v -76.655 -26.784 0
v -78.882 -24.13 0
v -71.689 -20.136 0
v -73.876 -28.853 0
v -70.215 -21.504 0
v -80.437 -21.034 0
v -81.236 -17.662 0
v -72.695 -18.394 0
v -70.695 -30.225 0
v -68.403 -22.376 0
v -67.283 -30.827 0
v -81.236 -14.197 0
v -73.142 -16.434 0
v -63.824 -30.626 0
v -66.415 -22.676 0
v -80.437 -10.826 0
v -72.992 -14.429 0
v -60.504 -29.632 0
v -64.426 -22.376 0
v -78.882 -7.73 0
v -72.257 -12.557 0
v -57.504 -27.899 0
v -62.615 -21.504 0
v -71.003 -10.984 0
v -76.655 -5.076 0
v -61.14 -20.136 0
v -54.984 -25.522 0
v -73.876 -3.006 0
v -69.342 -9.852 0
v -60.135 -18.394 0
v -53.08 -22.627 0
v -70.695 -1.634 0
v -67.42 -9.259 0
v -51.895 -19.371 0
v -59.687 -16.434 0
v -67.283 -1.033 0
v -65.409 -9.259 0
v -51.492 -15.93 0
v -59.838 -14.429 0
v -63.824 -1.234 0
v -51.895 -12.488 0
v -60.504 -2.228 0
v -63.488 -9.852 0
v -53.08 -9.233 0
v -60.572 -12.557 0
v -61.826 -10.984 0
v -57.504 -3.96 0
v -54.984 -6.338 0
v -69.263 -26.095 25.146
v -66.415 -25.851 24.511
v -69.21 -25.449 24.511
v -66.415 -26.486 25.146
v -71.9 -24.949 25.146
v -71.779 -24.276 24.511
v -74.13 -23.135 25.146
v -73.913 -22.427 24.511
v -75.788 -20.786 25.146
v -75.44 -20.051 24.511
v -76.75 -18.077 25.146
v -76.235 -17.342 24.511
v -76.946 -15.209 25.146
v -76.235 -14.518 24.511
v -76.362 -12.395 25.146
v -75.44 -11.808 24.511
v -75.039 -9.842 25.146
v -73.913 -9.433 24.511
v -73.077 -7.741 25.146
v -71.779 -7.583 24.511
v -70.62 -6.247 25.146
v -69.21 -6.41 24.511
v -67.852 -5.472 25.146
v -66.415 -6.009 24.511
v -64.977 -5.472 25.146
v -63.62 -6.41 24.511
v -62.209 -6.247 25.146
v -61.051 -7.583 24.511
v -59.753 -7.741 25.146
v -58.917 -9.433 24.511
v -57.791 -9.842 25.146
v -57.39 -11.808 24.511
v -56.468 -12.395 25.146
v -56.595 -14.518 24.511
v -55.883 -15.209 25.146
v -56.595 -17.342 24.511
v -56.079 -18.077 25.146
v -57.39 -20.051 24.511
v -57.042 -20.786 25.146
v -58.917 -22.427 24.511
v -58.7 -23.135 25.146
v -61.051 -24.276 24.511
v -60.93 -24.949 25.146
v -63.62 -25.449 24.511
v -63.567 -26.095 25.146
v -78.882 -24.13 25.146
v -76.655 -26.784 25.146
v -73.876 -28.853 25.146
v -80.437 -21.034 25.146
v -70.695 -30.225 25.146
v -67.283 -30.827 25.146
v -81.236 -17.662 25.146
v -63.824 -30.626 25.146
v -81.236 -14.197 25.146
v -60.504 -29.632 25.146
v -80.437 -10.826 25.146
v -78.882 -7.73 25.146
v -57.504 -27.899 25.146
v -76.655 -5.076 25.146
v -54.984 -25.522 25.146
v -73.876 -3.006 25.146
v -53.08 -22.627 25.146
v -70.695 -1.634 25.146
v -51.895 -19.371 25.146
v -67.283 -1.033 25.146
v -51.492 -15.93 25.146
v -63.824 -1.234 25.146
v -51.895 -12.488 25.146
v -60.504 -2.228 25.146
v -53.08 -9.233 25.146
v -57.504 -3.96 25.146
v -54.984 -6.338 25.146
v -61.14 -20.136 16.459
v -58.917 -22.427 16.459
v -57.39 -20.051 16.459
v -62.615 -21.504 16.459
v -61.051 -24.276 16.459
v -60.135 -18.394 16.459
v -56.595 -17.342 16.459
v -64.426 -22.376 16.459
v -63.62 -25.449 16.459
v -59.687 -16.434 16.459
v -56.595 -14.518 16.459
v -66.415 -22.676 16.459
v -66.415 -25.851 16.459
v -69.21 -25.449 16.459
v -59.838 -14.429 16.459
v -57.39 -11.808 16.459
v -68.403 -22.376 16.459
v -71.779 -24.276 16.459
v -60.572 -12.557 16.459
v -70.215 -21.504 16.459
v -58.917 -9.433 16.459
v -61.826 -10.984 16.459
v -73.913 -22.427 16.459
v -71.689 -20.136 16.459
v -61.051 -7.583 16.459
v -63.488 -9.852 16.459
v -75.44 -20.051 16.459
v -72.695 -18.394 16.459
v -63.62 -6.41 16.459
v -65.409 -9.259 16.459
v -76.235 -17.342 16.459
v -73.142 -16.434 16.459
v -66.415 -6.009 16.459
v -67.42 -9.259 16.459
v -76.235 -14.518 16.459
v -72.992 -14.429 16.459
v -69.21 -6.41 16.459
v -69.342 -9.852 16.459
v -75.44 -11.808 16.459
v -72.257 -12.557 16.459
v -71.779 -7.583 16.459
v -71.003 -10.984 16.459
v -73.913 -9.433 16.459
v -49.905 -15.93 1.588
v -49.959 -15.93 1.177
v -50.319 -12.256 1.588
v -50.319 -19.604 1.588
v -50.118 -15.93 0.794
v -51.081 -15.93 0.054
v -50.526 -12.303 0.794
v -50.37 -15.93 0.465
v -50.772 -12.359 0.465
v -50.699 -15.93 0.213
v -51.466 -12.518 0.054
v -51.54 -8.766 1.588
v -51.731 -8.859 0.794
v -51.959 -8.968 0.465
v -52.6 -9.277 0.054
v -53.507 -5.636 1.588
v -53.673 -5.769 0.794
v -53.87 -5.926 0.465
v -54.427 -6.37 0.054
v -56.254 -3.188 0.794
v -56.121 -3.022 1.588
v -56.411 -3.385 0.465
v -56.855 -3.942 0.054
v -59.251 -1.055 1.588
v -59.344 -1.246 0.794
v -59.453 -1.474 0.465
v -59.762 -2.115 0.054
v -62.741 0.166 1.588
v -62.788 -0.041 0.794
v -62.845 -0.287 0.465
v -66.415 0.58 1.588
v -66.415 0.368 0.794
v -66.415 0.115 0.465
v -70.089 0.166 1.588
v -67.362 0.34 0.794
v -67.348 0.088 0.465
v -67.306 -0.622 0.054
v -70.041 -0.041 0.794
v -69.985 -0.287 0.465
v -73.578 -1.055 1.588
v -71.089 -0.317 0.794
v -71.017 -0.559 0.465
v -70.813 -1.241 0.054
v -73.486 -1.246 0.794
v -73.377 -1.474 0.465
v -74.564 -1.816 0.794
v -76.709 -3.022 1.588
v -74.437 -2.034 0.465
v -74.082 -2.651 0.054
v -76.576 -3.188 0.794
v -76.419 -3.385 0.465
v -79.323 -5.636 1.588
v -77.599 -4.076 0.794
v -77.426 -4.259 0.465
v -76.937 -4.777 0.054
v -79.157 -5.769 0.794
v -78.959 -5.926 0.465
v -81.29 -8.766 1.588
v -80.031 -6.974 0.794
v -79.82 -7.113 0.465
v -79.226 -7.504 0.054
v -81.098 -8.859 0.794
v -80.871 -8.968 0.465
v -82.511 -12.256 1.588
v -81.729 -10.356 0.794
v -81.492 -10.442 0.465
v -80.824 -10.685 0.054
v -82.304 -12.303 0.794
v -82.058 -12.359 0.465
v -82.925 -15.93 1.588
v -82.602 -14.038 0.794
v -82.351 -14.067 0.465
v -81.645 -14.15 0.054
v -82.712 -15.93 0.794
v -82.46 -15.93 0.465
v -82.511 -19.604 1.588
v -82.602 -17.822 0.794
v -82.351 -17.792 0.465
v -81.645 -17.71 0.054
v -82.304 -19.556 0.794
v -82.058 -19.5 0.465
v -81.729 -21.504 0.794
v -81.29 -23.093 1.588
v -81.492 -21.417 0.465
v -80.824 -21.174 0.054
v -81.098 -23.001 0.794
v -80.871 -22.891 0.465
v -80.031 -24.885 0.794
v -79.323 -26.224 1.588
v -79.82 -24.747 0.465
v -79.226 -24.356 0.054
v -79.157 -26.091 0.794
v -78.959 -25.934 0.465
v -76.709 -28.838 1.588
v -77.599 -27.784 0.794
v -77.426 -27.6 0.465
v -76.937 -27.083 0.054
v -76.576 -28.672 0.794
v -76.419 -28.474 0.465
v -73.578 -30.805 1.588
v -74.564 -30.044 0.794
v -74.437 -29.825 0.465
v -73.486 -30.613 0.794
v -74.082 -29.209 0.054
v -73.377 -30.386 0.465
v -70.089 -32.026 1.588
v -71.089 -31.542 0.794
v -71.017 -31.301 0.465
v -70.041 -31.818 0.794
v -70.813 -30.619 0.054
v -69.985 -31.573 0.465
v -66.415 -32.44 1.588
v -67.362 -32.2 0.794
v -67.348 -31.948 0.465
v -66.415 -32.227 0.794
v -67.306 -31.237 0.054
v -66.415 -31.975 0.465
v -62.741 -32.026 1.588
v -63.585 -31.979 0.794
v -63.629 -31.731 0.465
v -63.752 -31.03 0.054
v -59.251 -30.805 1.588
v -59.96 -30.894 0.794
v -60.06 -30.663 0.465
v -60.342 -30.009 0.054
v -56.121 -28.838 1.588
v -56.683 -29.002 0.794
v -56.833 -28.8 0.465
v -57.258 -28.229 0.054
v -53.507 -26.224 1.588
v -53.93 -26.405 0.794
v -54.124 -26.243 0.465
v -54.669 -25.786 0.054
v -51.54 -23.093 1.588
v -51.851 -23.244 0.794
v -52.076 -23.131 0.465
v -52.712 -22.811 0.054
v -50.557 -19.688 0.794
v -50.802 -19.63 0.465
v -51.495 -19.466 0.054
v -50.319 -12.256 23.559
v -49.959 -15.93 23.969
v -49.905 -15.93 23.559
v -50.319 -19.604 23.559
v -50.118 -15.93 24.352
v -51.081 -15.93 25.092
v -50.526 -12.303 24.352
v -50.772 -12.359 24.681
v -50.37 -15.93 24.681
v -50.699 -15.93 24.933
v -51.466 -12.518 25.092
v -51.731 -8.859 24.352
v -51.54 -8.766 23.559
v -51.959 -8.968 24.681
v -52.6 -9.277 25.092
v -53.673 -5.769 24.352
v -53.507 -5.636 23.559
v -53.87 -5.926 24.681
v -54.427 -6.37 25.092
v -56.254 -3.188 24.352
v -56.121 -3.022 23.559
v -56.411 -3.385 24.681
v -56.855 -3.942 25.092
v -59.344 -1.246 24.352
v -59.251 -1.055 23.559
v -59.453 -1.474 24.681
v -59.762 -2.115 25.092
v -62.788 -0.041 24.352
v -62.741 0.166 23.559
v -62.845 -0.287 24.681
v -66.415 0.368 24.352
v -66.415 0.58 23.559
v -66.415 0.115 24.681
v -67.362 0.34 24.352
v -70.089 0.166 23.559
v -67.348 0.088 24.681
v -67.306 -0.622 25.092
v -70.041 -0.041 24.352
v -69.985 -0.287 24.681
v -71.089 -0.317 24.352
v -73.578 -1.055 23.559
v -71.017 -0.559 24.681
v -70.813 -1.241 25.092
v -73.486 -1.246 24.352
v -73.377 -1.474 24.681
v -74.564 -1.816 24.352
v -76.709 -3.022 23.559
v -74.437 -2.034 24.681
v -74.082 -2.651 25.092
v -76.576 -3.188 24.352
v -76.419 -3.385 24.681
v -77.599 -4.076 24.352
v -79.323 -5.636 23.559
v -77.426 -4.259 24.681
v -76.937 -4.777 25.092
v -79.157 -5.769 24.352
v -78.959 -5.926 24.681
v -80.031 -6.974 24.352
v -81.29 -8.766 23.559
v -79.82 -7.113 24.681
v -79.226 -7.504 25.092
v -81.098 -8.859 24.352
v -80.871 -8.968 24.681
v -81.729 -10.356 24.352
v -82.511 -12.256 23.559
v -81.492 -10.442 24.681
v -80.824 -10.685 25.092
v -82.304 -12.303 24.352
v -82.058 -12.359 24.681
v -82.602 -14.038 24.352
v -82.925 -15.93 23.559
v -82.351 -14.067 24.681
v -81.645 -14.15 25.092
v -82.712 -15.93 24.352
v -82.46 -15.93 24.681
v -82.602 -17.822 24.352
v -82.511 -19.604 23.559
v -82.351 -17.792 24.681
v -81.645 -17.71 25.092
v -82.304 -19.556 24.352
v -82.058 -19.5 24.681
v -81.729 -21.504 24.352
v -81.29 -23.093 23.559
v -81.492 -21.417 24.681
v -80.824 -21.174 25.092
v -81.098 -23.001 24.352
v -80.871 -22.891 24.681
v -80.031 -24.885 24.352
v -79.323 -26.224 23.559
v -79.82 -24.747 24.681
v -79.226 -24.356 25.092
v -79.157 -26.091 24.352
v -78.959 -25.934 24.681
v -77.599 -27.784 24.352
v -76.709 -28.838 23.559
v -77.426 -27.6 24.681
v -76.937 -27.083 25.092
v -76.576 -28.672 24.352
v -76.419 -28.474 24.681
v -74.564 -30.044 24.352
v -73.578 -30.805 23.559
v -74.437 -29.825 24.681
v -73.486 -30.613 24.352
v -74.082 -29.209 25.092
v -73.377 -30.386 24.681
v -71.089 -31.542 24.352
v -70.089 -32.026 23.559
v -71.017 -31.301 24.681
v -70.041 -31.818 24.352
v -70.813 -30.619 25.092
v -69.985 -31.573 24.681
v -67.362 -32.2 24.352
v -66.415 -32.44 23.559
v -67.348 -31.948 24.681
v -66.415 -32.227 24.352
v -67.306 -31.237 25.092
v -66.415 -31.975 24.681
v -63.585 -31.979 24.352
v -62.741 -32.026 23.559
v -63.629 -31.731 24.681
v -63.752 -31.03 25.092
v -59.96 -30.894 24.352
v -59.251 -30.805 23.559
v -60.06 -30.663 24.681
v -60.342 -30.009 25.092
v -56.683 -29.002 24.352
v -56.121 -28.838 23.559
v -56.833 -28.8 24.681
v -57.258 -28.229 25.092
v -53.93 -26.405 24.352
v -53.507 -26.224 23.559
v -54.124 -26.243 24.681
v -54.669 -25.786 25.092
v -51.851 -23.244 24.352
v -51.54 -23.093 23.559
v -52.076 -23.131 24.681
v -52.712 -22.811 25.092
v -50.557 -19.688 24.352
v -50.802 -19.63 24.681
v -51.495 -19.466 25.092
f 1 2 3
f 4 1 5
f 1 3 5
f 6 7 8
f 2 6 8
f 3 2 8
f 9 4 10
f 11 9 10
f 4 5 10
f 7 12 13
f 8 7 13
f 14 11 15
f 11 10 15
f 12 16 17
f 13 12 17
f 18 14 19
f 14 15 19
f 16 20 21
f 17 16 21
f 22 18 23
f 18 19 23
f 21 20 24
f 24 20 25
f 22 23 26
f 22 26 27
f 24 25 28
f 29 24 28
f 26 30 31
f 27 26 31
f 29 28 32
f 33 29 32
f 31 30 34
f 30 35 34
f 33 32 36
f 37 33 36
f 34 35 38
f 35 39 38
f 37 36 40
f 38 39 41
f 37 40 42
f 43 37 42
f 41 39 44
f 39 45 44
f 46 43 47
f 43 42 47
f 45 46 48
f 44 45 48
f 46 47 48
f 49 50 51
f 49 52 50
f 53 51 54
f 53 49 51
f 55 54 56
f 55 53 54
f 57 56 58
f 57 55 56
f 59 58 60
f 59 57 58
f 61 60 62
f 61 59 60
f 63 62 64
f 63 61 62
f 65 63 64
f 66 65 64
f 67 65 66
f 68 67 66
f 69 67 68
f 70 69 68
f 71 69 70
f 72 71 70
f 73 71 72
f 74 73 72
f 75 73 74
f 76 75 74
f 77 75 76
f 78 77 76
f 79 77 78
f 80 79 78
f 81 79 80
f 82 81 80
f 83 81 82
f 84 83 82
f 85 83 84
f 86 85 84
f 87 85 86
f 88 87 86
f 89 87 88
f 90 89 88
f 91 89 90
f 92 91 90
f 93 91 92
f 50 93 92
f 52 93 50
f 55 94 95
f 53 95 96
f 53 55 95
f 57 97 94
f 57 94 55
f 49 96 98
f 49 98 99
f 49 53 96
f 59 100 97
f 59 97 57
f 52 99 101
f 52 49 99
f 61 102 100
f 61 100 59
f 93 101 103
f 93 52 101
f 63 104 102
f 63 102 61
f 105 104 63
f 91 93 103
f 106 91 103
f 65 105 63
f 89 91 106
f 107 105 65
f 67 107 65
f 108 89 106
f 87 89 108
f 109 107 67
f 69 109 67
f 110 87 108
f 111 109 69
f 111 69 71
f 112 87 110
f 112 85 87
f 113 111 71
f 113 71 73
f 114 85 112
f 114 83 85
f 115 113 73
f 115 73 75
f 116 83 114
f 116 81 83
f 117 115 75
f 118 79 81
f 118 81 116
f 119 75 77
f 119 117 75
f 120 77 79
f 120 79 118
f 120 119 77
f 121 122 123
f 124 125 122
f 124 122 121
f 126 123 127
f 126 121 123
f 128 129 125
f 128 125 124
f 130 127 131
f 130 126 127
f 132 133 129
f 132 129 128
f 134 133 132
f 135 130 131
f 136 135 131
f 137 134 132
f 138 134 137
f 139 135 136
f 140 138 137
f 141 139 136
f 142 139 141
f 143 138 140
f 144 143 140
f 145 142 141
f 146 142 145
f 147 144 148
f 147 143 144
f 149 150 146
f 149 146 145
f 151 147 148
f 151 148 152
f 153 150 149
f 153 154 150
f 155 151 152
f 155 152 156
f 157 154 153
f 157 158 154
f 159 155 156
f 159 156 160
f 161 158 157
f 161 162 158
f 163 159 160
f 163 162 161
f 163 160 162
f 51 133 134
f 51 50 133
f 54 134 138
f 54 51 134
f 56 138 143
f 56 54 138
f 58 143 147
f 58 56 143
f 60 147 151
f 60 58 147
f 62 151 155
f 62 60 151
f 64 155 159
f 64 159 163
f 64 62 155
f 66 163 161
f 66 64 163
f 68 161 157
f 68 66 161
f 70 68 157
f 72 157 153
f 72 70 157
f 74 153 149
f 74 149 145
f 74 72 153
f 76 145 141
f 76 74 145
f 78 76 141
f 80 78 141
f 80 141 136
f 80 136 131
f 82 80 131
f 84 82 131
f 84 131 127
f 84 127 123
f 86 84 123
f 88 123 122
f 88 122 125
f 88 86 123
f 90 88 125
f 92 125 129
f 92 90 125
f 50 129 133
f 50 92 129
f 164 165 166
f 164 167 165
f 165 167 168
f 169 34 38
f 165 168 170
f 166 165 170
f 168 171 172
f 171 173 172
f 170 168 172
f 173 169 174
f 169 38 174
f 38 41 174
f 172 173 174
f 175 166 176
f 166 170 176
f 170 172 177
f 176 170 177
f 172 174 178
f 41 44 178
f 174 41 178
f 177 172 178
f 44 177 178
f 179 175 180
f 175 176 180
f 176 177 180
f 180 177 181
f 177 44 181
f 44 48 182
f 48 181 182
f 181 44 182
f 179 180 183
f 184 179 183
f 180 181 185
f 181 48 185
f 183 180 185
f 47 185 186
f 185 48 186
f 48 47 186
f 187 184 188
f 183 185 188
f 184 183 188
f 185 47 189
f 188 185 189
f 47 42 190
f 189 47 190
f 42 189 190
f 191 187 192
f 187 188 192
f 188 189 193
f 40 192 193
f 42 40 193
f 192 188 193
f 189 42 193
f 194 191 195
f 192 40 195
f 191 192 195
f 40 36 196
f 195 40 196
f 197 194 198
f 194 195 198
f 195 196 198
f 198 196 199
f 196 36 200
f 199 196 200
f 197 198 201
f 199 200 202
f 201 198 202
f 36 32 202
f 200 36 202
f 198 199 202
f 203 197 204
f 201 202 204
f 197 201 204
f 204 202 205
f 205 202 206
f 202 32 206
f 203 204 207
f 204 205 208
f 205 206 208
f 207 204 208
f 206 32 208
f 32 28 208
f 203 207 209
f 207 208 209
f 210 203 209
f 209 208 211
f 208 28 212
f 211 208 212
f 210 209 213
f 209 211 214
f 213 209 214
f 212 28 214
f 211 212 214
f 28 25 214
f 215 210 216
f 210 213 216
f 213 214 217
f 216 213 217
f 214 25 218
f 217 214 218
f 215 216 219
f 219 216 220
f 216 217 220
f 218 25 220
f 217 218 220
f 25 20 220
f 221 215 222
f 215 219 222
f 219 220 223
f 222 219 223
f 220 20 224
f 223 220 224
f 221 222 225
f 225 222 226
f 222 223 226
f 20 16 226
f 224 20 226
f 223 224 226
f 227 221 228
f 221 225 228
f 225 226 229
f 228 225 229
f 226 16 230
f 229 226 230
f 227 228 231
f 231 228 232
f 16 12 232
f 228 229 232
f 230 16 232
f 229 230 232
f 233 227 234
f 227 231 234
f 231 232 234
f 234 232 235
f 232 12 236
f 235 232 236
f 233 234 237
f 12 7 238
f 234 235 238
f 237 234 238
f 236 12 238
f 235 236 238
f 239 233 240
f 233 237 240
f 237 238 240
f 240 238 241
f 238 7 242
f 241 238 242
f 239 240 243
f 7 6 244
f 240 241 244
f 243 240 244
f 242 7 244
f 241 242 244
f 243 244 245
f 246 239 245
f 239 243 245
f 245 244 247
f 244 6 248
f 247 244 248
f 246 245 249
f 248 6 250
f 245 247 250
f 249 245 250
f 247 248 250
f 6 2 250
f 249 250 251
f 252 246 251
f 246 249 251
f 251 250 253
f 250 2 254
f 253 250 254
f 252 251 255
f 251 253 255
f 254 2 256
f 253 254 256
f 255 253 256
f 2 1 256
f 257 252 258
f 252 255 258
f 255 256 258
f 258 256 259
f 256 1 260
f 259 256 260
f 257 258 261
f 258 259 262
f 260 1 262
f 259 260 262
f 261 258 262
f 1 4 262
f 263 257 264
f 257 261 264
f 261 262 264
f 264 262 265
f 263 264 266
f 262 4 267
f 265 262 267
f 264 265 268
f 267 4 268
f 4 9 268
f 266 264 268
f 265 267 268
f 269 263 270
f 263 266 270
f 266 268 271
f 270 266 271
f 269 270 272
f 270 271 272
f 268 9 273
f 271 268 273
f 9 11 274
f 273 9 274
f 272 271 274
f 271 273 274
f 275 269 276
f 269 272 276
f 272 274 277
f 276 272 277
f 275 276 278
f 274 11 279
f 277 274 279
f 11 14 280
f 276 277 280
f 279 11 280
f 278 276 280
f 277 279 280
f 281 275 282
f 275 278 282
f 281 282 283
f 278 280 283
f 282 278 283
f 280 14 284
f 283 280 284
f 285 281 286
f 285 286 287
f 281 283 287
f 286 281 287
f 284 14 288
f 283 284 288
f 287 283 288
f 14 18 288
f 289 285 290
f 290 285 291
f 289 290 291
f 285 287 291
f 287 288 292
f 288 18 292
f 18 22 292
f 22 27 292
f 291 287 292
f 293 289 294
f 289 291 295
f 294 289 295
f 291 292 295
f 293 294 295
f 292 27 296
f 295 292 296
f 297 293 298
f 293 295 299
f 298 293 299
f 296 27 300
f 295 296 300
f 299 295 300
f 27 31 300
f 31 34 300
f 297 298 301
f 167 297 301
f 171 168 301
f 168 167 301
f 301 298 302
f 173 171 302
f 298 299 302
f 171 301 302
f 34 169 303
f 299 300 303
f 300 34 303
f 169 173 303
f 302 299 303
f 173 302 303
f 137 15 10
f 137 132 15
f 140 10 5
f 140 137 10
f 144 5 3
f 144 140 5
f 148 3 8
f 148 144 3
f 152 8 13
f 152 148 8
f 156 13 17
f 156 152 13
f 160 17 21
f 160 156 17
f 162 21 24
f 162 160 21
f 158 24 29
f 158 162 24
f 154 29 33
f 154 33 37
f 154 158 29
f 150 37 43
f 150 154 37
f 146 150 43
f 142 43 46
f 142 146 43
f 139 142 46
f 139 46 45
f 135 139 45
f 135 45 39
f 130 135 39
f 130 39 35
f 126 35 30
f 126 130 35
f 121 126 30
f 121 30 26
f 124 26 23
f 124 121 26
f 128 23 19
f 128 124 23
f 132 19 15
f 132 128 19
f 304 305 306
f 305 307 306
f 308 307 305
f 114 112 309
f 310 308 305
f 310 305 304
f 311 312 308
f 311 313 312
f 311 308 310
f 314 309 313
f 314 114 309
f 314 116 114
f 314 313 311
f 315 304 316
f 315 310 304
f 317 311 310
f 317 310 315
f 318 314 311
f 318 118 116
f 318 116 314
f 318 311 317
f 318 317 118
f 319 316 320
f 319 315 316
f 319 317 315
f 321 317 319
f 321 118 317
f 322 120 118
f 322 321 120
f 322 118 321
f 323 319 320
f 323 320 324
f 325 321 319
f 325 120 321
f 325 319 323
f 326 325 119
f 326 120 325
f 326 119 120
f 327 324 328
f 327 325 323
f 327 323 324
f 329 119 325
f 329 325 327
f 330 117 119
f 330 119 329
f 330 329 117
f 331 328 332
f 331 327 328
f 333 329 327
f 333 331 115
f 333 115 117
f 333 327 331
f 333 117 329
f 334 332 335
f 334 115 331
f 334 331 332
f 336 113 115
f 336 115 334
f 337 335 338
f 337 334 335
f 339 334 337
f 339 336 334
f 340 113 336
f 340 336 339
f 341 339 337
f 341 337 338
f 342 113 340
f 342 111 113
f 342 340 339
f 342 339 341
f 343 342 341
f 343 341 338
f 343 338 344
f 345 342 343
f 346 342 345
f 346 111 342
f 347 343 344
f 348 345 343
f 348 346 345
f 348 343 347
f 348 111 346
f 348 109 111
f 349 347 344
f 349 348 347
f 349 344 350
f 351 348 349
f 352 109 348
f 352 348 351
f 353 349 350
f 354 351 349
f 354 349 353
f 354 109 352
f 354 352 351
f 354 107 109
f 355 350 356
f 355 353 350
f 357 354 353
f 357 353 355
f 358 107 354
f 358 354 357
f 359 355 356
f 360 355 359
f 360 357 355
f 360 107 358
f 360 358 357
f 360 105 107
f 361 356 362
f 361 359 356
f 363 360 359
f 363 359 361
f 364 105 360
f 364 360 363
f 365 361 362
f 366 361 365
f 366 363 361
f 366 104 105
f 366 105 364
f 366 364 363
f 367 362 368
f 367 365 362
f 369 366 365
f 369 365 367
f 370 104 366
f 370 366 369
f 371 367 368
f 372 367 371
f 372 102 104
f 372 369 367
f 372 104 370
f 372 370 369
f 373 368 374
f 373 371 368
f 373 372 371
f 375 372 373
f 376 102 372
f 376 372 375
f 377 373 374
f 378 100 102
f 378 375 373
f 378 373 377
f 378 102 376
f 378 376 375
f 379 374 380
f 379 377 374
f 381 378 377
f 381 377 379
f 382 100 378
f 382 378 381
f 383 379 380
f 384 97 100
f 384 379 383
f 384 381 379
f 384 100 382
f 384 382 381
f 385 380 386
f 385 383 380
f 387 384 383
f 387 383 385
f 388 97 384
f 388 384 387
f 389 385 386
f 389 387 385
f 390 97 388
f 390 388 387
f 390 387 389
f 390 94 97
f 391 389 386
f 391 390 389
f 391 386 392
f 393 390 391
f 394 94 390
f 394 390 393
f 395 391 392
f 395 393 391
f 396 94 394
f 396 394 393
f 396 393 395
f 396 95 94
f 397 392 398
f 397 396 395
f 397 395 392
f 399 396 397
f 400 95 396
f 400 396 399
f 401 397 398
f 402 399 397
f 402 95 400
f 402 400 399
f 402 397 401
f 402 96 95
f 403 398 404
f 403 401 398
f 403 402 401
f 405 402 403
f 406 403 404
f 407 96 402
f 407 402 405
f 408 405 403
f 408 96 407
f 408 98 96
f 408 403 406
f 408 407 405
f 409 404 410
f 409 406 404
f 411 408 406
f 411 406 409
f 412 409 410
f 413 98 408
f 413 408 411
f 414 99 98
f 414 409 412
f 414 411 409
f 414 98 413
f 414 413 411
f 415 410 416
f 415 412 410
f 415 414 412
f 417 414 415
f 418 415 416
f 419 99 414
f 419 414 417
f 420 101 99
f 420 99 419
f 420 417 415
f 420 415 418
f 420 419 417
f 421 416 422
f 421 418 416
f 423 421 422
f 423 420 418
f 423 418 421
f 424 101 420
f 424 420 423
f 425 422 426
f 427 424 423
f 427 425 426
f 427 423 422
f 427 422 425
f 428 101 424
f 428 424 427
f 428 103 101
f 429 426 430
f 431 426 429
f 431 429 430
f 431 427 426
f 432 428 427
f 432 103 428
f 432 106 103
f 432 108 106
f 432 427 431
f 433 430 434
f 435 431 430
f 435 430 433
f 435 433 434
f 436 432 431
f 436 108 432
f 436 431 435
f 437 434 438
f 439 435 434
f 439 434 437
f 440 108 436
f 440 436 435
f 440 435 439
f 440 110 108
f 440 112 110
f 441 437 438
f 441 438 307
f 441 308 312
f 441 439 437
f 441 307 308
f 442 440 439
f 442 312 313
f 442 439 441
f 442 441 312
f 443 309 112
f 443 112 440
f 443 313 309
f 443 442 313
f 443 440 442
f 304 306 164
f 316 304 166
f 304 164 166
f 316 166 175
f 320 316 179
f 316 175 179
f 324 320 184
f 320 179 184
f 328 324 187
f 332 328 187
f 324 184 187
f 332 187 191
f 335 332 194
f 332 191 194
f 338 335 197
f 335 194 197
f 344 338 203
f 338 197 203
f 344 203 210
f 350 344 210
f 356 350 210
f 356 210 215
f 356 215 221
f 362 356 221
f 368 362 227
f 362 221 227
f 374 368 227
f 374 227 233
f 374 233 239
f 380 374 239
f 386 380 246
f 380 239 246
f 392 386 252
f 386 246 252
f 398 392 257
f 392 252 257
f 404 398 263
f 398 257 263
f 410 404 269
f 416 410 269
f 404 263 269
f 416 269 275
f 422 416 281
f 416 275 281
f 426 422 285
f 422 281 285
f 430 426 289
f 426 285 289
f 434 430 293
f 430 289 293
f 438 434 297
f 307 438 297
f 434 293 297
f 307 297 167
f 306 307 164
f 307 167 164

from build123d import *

# Parameters (mm, degrees)
SKETCH1_R           = 16.51
SKETCH1_R_2         = 4.7625
BOSS_EXTRUDE1_DEPTH = 25.146
FILLET2_R           = 1.5875


with BuildPart() as part:
    # Sketch1 → Boss-Extrude1 (new body)
    with BuildSketch(Plane.XY):
        with Locations((-66.414856712, -15.92976268)):
            Circle(SKETCH1_R)
        with Locations((-66.414856712, -15.92976268)):
            Circle(SKETCH1_R_2, mode=Mode.SUBTRACT)
    extrude(amount=BOSS_EXTRUDE1_DEPTH)

    # Fillet2
    fillet2_edges = [part.edges().sort_by_distance(p)[0] for p in [
        (-82.924856712, -15.92976268, 0),
        (-82.924856712, -15.92976268, 25.146),
    ]]
    fillet(fillet2_edges, radius=FILLET2_R)

    # Sketch4 → CBORE for 1/2 Socket Shoulder Screw1 (revolve, cut)
    with BuildSketch(Plane(origin=(-66.414856712, -15.92976268, 25.146), x_dir=(0, -1, 0), z_dir=(1, 0, 0))):
        Polygon((0, 0), (0, 25.146), (6.74624, 25.146), (6.74624, 8.6868), (9.92124, 8.6868), (9.92124, 0.635), (10.55624, 0), align=None)
    revolve(axis=Axis((-66.414856712, -15.92976268, 31.496), (0, 0, -1)), mode=Mode.SUBTRACT)


solid = part.part
